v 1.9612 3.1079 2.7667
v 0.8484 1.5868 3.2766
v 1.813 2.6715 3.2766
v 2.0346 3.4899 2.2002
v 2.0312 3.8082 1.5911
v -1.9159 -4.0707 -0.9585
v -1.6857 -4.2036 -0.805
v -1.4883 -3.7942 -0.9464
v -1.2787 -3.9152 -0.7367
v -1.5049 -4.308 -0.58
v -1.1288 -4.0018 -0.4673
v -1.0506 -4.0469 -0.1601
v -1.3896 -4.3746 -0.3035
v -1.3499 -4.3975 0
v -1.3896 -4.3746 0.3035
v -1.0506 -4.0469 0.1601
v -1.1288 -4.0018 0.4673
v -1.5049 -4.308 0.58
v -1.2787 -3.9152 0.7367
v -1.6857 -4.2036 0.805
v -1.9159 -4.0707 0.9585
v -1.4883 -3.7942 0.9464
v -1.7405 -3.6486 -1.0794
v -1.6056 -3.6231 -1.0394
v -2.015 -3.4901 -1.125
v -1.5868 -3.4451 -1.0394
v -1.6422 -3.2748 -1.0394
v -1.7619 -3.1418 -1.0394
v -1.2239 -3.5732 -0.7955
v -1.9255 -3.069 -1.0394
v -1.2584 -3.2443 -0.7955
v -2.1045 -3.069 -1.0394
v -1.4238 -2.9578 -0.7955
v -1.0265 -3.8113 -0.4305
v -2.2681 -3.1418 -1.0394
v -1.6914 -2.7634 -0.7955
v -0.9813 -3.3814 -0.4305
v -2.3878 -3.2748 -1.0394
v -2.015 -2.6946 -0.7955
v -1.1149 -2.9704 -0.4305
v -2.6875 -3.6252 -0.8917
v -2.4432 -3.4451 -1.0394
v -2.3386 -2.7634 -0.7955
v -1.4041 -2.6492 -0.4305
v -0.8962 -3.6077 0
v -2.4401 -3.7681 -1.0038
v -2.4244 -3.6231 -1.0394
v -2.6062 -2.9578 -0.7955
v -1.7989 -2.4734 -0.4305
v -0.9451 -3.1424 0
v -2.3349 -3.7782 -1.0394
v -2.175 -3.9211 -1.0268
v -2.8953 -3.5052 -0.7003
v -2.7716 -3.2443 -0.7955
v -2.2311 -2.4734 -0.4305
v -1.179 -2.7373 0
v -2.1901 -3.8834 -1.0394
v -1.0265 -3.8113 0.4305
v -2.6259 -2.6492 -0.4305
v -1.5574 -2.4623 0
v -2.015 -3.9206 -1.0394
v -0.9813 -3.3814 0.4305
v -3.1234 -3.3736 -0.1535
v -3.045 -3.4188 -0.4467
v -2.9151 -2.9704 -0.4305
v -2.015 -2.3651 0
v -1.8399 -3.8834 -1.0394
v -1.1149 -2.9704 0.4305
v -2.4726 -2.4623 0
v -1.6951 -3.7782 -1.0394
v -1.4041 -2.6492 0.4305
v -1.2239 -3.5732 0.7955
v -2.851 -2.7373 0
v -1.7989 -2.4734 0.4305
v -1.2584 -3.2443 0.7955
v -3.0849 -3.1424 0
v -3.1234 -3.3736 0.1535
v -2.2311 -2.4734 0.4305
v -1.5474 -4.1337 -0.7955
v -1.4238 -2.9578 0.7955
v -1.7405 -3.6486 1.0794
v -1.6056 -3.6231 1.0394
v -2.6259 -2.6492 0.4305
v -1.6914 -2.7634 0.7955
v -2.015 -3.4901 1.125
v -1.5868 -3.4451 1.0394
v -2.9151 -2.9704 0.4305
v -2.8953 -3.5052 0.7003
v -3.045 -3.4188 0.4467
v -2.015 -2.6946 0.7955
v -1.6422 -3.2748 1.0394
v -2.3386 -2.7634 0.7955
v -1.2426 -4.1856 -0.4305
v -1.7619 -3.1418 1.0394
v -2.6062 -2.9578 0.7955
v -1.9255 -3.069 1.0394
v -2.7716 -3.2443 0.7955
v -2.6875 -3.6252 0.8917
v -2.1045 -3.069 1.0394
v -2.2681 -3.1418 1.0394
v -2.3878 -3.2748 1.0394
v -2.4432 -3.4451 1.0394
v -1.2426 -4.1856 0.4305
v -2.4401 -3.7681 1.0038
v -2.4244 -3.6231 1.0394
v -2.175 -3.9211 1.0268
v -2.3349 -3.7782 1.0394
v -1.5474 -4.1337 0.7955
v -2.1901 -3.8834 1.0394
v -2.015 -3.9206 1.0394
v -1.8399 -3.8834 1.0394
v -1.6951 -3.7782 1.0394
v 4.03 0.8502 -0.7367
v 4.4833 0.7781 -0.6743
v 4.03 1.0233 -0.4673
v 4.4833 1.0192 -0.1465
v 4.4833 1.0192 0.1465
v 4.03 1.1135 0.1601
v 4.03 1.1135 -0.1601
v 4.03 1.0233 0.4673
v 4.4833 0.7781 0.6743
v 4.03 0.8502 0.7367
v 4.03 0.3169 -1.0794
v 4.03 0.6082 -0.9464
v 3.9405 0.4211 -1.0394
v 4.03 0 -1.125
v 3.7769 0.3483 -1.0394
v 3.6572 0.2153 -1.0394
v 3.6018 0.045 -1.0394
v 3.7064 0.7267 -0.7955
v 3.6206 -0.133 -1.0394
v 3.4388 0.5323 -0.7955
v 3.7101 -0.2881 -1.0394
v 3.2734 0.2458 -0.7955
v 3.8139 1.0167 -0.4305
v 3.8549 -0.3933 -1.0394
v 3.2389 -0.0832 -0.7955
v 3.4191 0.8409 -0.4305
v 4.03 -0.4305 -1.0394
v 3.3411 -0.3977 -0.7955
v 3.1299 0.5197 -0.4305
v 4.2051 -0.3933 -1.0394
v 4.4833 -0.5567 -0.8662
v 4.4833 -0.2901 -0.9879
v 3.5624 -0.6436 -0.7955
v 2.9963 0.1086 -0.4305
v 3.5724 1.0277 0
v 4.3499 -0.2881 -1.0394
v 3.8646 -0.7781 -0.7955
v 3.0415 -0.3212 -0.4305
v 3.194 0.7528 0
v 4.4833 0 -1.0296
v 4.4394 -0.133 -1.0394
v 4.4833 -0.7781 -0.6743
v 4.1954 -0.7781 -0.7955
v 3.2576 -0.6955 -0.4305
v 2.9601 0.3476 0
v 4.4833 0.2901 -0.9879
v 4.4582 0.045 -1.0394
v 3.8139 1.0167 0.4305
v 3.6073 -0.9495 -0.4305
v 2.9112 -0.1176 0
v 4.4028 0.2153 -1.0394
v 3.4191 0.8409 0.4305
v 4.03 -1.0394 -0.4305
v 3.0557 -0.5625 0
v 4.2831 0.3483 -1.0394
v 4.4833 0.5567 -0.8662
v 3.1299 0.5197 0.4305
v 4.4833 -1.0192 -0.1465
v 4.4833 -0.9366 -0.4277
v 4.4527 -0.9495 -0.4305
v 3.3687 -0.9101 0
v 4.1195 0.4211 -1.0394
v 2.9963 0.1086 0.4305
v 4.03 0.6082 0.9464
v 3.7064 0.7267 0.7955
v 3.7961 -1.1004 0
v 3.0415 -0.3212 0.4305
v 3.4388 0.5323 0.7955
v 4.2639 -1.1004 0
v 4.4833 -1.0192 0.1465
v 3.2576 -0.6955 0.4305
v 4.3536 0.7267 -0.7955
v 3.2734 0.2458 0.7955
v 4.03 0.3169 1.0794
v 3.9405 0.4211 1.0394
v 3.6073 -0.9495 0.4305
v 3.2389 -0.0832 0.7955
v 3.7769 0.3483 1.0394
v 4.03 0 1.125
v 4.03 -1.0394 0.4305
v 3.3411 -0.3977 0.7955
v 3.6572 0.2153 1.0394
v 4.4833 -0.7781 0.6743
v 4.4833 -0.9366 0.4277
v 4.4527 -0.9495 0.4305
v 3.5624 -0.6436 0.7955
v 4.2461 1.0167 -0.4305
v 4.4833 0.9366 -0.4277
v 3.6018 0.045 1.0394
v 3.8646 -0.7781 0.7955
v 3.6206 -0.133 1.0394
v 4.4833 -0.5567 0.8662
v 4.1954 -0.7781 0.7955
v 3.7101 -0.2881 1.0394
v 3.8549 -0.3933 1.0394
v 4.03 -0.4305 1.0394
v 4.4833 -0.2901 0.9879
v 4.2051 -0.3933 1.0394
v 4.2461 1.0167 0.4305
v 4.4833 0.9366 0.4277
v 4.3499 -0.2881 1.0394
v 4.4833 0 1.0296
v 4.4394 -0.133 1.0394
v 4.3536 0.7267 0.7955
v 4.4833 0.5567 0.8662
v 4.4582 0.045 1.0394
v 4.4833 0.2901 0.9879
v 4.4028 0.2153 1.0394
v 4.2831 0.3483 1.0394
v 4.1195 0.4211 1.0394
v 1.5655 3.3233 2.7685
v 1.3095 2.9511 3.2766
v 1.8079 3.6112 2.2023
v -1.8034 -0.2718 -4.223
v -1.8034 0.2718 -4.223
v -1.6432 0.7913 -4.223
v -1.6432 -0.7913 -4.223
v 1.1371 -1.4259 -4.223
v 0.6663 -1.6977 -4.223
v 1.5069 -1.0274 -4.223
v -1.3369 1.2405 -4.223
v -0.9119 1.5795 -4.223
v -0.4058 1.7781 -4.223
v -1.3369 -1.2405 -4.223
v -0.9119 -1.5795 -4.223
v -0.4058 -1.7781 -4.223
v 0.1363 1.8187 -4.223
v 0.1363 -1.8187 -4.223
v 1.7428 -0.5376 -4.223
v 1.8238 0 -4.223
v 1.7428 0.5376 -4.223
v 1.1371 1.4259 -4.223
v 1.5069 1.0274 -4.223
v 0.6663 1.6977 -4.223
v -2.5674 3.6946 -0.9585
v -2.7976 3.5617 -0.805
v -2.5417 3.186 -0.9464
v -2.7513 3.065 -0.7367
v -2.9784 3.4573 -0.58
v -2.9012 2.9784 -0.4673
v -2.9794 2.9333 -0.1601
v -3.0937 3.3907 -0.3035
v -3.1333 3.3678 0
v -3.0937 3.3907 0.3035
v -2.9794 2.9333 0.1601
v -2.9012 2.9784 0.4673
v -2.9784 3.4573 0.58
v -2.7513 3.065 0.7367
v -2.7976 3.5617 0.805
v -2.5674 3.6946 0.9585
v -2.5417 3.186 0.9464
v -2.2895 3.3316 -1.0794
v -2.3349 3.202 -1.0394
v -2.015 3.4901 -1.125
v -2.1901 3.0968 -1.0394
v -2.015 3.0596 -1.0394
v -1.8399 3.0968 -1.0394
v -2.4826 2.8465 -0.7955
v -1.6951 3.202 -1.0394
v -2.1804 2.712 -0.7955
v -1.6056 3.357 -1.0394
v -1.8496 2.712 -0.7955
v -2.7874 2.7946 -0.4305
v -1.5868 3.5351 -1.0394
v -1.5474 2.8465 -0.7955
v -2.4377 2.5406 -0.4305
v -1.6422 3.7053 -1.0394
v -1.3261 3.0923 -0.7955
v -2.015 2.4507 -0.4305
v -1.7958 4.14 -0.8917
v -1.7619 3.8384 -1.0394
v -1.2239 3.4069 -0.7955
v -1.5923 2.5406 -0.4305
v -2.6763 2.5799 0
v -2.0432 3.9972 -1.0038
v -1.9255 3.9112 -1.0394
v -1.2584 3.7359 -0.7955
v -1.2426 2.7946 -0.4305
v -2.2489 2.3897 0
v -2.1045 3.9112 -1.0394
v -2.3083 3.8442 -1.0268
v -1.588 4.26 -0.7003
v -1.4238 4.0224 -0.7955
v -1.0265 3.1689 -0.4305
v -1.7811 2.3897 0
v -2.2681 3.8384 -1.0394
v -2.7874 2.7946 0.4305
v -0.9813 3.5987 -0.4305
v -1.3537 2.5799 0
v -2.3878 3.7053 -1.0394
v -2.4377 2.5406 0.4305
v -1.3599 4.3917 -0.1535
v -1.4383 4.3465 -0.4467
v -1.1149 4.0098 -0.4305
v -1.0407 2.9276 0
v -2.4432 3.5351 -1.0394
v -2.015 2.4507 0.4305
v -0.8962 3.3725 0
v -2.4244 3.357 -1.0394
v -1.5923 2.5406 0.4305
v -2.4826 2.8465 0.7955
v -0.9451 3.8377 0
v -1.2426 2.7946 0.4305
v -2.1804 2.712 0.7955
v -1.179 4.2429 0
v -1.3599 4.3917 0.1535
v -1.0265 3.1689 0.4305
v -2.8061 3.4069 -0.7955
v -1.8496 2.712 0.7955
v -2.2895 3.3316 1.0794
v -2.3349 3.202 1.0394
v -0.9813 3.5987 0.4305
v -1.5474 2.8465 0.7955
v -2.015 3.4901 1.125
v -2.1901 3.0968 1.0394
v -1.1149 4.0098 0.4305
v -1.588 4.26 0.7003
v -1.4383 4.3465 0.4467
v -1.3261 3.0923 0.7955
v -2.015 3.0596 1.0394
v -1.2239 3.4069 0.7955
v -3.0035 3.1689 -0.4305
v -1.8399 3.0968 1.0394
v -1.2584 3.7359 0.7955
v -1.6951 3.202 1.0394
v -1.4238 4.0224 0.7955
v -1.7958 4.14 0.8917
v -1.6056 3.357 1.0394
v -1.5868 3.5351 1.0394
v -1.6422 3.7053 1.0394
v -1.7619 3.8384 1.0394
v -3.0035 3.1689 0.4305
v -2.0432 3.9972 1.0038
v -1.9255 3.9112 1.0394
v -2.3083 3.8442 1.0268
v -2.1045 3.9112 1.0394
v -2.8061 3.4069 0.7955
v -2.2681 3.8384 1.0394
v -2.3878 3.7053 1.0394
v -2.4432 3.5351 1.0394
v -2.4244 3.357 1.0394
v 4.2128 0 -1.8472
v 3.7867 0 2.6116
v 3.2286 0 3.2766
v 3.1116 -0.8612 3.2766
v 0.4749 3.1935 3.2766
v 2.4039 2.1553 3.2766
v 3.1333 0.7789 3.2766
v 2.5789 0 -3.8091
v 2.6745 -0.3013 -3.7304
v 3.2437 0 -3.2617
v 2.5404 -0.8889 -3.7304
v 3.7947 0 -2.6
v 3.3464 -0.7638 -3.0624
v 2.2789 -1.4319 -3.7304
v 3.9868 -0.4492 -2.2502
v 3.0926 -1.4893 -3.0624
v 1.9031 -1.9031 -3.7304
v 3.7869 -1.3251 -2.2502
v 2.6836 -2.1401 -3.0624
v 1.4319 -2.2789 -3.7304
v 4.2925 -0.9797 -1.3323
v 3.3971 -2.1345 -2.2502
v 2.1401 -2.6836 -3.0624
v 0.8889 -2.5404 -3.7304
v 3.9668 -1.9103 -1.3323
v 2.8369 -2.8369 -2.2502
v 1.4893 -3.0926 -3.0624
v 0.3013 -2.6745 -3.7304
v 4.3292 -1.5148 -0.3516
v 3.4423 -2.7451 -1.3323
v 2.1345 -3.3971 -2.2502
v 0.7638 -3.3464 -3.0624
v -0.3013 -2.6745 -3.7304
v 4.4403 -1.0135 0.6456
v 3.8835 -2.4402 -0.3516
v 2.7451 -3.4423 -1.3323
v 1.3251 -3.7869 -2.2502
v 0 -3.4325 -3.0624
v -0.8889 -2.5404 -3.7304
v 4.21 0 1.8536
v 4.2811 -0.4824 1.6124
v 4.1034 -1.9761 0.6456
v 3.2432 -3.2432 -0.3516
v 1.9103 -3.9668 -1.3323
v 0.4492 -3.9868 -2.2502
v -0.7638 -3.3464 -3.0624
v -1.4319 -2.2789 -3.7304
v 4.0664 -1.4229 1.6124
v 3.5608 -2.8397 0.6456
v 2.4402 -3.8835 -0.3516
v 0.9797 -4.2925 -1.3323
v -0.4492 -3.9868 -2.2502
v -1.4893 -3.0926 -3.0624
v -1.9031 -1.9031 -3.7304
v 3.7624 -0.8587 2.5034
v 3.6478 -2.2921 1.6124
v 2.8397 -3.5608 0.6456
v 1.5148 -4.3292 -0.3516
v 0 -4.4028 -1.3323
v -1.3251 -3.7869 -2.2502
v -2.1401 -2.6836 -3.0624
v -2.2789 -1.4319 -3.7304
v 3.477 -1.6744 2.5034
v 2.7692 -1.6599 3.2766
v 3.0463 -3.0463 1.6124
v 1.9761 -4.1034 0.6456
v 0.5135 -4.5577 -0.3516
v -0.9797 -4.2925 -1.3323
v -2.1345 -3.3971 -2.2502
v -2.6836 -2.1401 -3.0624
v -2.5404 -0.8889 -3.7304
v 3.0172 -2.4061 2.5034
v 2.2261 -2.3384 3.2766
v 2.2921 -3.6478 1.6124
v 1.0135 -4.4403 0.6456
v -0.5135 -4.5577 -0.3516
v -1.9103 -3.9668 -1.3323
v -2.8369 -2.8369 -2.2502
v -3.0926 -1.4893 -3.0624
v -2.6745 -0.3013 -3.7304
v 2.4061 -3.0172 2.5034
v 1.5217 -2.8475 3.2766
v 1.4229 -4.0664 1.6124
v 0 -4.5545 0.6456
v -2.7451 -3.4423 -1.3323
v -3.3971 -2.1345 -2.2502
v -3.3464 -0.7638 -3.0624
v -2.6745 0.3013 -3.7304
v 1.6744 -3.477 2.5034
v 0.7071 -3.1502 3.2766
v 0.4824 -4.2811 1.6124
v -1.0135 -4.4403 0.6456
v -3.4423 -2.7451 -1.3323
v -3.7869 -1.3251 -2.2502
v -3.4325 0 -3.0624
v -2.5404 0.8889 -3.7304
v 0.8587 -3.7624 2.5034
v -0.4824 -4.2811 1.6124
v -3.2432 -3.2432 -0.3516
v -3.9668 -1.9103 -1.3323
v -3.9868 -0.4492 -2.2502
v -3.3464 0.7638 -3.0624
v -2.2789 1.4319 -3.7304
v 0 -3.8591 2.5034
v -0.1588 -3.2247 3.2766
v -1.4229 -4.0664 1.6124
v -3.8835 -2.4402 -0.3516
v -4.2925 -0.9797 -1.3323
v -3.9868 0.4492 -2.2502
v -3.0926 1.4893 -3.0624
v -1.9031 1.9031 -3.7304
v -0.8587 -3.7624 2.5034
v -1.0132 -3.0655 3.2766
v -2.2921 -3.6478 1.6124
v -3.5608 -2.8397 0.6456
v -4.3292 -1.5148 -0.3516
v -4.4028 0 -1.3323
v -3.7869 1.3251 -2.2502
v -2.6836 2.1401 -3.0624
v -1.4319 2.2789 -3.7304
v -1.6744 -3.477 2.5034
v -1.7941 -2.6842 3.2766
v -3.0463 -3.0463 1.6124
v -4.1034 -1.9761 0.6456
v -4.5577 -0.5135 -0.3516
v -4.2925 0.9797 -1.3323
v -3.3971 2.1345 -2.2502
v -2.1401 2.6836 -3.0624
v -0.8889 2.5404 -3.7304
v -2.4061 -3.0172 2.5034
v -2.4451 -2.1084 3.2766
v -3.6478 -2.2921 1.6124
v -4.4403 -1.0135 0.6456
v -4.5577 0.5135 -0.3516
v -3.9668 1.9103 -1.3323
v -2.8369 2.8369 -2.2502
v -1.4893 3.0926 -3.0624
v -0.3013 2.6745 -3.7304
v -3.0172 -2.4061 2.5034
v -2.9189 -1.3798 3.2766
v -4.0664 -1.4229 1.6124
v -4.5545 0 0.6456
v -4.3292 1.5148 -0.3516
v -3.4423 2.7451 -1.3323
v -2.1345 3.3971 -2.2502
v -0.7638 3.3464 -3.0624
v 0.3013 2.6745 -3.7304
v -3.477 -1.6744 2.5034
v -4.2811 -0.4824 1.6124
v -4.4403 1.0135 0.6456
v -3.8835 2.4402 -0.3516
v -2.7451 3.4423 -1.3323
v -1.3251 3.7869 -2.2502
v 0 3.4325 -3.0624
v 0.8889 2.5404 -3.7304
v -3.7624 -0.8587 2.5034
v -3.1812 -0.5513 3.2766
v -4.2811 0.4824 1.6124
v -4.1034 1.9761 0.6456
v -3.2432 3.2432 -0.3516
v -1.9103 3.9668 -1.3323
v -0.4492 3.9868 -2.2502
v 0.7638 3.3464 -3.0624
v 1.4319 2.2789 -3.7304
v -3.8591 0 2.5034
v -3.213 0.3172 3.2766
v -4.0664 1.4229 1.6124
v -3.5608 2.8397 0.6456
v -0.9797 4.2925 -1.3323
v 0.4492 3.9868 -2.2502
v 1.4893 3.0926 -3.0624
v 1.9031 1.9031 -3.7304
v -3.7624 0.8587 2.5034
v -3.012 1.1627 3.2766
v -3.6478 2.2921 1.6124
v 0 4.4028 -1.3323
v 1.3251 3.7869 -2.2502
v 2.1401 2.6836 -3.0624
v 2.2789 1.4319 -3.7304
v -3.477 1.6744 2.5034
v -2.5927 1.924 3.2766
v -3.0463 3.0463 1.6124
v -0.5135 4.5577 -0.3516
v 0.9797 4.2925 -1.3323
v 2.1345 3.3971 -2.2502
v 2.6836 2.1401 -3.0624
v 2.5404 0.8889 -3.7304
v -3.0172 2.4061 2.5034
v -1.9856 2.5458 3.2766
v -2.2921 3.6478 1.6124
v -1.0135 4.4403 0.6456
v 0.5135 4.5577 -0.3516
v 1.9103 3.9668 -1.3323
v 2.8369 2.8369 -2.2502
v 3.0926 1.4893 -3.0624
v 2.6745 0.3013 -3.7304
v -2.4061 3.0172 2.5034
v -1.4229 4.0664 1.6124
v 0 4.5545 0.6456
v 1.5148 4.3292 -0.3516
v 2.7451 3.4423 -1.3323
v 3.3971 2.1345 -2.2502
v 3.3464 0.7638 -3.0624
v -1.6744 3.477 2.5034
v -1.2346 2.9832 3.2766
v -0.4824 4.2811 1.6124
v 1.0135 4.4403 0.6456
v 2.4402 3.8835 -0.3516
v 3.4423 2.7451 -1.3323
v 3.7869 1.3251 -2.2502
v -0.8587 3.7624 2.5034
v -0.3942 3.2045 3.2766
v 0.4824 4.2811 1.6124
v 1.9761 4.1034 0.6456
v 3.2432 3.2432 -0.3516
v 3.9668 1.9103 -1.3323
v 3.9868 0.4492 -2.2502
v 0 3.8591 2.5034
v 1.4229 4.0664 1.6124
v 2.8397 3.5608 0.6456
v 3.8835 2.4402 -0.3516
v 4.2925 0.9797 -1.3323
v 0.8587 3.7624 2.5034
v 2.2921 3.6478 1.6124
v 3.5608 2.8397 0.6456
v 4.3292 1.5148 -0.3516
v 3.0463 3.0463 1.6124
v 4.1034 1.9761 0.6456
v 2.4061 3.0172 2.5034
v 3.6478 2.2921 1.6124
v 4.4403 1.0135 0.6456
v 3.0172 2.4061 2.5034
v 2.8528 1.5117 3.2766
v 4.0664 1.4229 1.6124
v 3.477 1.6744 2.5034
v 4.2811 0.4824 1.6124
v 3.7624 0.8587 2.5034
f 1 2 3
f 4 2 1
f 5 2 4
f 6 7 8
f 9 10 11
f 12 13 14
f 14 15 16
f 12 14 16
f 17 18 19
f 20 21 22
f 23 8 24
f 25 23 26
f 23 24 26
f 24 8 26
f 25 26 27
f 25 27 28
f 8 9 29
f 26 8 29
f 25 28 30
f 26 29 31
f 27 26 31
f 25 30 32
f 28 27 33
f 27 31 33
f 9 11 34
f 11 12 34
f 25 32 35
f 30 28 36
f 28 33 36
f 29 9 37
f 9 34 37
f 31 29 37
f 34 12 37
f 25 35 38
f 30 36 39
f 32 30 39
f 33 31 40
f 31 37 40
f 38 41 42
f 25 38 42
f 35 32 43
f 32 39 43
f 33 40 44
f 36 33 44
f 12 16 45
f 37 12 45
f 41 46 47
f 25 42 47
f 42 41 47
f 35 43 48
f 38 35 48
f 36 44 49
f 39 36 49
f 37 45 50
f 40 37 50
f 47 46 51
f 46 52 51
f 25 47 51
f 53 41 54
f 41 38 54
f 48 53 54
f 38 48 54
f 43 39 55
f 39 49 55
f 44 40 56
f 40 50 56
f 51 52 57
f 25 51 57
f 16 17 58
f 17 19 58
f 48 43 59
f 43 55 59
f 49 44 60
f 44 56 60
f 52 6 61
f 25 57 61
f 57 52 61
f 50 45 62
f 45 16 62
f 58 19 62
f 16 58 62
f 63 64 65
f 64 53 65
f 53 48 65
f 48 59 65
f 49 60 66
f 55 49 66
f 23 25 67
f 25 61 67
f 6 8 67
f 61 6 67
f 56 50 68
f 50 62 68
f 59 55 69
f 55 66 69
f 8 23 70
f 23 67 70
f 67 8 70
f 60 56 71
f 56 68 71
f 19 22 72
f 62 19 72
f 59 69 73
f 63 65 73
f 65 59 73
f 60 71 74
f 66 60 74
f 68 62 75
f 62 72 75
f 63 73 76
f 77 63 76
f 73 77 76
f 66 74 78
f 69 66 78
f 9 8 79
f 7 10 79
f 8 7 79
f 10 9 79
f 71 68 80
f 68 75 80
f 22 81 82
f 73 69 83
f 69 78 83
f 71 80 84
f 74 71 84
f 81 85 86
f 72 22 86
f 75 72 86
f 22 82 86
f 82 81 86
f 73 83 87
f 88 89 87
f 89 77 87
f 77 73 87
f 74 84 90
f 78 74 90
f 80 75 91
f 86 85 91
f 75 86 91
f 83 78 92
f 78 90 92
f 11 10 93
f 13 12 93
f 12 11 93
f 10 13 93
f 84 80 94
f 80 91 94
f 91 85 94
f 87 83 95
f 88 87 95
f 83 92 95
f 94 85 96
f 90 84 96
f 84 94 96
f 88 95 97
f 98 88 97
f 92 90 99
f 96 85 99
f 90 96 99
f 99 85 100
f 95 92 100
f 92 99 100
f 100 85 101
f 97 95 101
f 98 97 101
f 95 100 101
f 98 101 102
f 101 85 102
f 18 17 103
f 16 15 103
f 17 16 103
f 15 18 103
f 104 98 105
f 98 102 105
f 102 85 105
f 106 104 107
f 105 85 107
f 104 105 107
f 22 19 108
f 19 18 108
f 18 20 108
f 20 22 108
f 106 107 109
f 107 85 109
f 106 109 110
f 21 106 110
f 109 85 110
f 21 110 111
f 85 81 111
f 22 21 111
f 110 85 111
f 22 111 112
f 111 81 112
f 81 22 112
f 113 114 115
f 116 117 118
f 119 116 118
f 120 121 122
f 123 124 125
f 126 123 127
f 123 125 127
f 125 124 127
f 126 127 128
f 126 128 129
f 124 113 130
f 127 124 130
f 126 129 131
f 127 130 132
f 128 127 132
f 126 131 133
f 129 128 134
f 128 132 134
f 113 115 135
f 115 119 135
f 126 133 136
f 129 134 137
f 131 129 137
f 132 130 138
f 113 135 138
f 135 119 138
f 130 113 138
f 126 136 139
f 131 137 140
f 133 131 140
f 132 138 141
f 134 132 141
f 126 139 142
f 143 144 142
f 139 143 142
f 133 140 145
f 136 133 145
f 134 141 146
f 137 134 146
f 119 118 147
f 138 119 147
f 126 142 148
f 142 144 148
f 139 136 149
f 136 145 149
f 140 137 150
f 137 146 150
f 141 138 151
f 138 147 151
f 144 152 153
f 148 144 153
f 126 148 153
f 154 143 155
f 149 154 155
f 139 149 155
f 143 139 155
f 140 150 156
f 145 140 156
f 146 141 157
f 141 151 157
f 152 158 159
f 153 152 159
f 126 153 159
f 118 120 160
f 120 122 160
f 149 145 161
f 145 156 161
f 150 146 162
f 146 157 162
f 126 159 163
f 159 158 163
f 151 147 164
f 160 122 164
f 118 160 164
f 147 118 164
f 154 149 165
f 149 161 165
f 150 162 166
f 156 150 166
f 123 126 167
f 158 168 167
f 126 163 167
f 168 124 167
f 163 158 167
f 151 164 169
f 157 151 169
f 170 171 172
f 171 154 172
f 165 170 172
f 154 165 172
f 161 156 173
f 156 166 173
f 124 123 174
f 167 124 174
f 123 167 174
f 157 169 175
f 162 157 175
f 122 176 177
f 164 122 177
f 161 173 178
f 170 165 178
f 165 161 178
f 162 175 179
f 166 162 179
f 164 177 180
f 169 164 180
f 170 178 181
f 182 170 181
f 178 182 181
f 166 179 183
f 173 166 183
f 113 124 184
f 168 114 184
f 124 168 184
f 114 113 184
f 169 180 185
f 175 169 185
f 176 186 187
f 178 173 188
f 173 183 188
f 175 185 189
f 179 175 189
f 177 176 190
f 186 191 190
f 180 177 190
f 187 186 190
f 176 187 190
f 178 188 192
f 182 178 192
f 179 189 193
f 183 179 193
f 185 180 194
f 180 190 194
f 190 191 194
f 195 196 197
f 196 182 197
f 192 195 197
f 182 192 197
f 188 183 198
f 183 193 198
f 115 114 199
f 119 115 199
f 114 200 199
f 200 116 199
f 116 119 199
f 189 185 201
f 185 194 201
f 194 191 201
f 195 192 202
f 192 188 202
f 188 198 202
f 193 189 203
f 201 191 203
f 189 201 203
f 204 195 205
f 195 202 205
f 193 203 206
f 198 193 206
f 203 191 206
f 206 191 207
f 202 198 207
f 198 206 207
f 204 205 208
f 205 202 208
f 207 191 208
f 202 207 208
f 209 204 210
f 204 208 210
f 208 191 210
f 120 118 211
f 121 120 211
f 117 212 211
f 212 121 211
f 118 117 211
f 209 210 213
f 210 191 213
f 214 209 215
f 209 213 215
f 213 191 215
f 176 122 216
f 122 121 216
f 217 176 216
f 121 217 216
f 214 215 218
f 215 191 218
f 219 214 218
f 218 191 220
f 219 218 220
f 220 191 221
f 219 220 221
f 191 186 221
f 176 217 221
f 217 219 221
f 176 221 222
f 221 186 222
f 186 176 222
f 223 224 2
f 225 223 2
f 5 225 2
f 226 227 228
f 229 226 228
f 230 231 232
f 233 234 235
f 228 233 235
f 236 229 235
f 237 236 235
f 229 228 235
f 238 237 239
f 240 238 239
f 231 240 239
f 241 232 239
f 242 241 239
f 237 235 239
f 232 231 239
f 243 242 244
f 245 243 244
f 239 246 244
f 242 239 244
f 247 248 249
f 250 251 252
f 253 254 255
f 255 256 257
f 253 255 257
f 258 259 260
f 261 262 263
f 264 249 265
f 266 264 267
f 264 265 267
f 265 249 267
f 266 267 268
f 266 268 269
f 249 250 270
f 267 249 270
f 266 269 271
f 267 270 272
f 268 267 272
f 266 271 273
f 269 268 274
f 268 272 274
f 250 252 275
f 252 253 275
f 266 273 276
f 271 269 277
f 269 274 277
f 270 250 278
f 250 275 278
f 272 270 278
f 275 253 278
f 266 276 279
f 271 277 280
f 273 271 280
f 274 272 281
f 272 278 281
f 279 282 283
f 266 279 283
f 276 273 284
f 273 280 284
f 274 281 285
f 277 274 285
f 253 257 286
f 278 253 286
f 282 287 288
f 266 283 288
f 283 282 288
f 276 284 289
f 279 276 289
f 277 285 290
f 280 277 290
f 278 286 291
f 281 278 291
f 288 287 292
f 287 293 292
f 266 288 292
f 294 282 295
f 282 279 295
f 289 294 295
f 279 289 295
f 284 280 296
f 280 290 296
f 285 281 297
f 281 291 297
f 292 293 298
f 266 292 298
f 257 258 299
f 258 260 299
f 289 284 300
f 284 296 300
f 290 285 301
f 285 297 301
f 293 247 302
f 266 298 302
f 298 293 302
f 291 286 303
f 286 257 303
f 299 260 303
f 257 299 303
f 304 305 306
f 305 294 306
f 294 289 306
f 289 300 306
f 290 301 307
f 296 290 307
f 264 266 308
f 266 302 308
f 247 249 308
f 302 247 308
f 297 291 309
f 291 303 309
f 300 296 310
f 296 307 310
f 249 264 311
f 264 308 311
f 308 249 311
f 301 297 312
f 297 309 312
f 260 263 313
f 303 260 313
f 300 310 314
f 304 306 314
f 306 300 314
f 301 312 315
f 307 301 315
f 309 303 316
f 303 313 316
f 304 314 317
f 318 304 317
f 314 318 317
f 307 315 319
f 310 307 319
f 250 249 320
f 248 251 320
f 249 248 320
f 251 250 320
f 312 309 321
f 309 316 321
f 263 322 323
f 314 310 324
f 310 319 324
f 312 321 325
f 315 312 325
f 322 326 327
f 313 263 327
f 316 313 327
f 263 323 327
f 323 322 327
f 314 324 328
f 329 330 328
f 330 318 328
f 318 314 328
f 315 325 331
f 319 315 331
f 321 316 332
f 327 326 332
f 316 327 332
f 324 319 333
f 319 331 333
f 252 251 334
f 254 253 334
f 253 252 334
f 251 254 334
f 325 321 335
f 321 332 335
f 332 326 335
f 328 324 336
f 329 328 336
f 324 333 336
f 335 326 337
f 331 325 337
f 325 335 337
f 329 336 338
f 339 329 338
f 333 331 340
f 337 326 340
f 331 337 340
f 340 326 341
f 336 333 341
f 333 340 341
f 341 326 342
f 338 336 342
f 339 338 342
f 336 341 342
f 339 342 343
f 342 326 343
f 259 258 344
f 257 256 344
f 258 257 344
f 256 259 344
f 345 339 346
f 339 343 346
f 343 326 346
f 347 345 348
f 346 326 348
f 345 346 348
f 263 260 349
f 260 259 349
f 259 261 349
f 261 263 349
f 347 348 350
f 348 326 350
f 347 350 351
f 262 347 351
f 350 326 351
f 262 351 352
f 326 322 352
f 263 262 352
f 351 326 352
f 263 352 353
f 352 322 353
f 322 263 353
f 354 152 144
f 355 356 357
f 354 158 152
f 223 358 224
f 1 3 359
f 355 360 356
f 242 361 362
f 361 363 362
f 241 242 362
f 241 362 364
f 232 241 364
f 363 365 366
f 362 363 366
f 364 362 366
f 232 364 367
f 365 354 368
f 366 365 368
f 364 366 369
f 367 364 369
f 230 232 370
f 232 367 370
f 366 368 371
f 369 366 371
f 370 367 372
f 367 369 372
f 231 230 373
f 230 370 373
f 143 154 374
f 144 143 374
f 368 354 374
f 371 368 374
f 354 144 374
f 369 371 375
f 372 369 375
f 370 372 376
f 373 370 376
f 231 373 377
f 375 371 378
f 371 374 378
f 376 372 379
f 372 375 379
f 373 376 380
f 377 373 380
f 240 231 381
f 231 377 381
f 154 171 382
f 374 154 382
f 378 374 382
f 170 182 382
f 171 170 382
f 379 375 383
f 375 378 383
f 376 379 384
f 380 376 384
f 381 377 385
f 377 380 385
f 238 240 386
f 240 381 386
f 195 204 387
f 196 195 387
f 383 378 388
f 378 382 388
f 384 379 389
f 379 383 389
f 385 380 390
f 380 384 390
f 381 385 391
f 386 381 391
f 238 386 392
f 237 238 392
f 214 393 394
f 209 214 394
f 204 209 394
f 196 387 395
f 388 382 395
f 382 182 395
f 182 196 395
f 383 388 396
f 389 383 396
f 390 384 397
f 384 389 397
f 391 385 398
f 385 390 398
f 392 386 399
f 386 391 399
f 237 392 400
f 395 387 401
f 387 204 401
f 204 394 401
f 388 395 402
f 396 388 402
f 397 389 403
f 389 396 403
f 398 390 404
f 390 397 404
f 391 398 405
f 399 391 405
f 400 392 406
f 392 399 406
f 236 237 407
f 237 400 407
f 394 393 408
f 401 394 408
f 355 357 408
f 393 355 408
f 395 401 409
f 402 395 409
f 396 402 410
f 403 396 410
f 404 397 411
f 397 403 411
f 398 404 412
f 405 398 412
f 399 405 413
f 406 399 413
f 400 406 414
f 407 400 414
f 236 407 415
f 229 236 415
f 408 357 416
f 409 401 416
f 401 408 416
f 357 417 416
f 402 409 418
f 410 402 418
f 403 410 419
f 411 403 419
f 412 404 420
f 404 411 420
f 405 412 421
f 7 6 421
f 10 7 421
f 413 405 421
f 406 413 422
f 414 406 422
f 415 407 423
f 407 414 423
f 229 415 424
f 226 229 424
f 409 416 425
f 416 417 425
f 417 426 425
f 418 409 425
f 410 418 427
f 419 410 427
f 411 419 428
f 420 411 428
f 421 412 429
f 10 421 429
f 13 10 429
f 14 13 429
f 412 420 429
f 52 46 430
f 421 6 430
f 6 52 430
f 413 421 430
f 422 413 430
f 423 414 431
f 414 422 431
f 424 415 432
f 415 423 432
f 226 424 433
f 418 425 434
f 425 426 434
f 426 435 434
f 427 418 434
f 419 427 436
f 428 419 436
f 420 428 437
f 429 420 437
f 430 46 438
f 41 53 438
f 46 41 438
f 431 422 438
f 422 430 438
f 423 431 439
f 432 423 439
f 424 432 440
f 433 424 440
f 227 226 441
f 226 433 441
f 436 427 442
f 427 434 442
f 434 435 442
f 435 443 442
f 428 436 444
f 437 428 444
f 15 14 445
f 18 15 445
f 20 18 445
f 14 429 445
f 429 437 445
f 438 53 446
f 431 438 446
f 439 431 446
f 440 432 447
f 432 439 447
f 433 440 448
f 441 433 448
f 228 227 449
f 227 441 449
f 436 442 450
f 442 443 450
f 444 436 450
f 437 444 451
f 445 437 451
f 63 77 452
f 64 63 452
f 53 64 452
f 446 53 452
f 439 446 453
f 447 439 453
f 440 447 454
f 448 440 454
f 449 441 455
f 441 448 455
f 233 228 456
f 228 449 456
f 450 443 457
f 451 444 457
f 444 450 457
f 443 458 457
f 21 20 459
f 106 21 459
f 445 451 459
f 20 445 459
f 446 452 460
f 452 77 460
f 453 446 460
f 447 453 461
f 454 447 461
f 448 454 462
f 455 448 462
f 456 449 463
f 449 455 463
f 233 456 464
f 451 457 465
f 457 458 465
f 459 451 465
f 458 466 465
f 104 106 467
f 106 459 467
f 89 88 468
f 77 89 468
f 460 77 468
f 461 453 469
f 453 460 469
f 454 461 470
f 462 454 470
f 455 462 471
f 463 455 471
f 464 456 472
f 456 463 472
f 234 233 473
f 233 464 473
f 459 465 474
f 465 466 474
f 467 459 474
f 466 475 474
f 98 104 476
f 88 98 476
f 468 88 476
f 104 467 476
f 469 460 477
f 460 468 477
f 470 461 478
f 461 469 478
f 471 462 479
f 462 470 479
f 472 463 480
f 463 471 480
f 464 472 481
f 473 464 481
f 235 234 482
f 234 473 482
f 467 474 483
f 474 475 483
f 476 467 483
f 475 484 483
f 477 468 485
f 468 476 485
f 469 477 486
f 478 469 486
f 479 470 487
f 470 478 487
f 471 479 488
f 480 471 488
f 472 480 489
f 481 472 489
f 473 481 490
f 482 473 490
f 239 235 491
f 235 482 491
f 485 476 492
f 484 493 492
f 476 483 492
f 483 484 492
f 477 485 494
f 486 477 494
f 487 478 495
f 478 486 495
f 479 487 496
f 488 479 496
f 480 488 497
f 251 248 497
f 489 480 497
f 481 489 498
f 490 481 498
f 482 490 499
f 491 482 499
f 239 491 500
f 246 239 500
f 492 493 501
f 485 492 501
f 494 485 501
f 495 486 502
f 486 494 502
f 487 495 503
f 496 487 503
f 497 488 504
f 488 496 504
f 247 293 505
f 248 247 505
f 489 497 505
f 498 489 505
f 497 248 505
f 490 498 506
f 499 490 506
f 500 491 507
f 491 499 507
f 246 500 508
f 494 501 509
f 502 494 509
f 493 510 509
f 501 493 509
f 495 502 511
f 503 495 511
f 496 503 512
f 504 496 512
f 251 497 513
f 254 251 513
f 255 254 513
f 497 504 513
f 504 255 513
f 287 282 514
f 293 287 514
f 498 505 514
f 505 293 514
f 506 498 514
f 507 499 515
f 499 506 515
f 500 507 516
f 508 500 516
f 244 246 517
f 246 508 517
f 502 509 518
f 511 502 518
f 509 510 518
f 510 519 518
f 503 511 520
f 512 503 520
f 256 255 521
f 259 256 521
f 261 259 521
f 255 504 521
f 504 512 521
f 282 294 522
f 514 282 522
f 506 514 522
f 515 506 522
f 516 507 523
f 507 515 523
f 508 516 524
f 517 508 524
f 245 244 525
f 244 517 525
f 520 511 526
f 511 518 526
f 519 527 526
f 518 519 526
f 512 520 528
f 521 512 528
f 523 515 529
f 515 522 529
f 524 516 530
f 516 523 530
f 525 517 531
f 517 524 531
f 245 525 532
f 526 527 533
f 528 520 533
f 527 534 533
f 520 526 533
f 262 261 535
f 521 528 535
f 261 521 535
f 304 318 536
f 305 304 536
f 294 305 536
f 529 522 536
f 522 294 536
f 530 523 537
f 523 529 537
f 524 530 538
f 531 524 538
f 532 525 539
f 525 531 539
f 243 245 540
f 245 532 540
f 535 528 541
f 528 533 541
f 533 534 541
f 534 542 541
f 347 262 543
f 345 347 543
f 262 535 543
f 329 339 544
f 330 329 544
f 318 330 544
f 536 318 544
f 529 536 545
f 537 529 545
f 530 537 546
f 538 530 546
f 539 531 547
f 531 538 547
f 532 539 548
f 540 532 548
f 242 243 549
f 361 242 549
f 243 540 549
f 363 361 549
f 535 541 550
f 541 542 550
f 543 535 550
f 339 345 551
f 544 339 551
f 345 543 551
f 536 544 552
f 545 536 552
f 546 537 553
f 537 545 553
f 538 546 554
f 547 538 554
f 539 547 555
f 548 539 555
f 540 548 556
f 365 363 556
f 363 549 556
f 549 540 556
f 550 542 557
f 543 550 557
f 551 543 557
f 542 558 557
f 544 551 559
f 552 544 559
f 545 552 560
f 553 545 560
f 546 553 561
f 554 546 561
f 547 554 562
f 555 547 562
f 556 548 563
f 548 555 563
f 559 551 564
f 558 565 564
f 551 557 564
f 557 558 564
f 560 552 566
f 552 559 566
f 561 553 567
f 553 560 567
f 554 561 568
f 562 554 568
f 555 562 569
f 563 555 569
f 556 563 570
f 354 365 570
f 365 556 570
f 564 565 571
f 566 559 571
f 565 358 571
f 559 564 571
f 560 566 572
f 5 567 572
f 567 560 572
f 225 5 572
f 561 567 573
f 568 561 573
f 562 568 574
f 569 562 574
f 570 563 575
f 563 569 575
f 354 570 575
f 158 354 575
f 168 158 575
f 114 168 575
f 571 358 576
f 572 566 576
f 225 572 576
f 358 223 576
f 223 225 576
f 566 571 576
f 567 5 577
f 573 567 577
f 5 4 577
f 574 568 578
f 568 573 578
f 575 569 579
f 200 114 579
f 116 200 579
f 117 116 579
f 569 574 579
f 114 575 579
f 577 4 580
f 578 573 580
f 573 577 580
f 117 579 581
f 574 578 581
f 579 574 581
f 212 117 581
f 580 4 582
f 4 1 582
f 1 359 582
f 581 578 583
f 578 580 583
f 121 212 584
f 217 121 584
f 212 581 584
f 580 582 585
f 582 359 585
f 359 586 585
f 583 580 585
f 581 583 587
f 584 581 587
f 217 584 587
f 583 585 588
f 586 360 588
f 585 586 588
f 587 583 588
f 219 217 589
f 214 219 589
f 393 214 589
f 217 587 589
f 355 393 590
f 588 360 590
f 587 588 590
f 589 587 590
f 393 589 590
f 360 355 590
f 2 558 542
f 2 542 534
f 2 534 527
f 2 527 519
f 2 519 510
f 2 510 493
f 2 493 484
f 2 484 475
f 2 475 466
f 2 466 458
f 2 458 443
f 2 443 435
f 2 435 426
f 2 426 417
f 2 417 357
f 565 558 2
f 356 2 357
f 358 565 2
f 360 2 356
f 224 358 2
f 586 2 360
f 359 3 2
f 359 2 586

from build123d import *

# Parameters (mm, degrees)
F4_R      = 3.25
F6_DEPTH  = 25.4
F5_R      = 13.27112349
F7_DEPTH  = 25.4
F31_DEPTH = 18.5


with BuildPart() as f1:
    # F0 (on Front) → F1 (revolve)
    with BuildSketch(Plane.XZ):
        with BuildLine():
            Line((0, 4.6), (0, -4.6))
            ThreePointArc((0, -4.6), (4.6, 0), (0, 4.6))
        make_face()
    revolve(axis=Axis((0, 0, 0), (0, 0, -1)))

    # F4 (on offset) → F6 (cut)
    with BuildSketch(Plane.XY.offset(3.2766)):
        Circle(F4_R)
    extrude(amount=F6_DEPTH, mode=Mode.SUBTRACT)

    # F5 (on offset) → F7 (cut)
    with BuildSketch(Plane.XY.offset(-4.223)):
        with Locations((-3.4608042333, 0)):
            Circle(F5_R)
    extrude(amount=-F7_DEPTH, mode=Mode.SUBTRACT)

    # F14 (on offset) → F15 (revolve, cut)
    with BuildSketch(Plane.YZ.offset(4.03)):
        with BuildLine():
            Line((0, 1.125), (0, 0))
            Line((0, 0), (0, -1.125))
            ThreePointArc((0, -1.125), (1.125, 0), (0, 1.125))
        make_face()
    revolve(axis=Axis((4.03, 0, 0), (0, 0, 1)), mode=Mode.SUBTRACT)

    # F18 (on offset) → F19 (revolve, cut)
    with BuildSketch(Plane(origin=(-2.015, 3.4900823773, 0), x_dir=(-0.8660254038, -0.5, 0), z_dir=(-0.5, 0.8660254038, 0))):
        with BuildLine():
            Line((0, 1.125), (0, 0))
            Line((0, 0), (0, -1.125))
            ThreePointArc((0, -1.125), (1.125, 0), (0, 1.125))
        make_face()
    revolve(axis=Axis((-2.015, 3.4900823773, 0), (0, 0, 1)), mode=Mode.SUBTRACT)

    # F22 (on offset) → F23 (revolve, cut)
    with BuildSketch(Plane(origin=(-2.015, -3.4900823773, 0), x_dir=(0.8660254038, -0.5, 0), z_dir=(-0.5, -0.8660254038, 0))):
        with BuildLine():
            Line((0, 1.125), (0, 0))
            Line((0, 0), (0, -1.125))
            ThreePointArc((0, -1.125), (1.125, 0), (0, 1.125))
        make_face()
    revolve(axis=Axis((-2.015, -3.4900823773, 0), (0, 0, 1)), mode=Mode.SUBTRACT)

    # F30 (on line) → F31 (cut)
    with BuildSketch(Plane(origin=(1.7017461736, 3.1961051858, -2.4250315045), x_dir=(0.9206065089, -0.3110824678, 0.2360325274), z_dir=(-0.3904915566, -0.7333949731, 0.5564603828))):
        Polygon((1.0608299635, 3.5694248509), (1.8751677126, 4.5393242035), (1.0608299635, 4.8561265068), align=None)
    extrude(amount=F31_DEPTH, mode=Mode.SUBTRACT)


solid = f1.part
